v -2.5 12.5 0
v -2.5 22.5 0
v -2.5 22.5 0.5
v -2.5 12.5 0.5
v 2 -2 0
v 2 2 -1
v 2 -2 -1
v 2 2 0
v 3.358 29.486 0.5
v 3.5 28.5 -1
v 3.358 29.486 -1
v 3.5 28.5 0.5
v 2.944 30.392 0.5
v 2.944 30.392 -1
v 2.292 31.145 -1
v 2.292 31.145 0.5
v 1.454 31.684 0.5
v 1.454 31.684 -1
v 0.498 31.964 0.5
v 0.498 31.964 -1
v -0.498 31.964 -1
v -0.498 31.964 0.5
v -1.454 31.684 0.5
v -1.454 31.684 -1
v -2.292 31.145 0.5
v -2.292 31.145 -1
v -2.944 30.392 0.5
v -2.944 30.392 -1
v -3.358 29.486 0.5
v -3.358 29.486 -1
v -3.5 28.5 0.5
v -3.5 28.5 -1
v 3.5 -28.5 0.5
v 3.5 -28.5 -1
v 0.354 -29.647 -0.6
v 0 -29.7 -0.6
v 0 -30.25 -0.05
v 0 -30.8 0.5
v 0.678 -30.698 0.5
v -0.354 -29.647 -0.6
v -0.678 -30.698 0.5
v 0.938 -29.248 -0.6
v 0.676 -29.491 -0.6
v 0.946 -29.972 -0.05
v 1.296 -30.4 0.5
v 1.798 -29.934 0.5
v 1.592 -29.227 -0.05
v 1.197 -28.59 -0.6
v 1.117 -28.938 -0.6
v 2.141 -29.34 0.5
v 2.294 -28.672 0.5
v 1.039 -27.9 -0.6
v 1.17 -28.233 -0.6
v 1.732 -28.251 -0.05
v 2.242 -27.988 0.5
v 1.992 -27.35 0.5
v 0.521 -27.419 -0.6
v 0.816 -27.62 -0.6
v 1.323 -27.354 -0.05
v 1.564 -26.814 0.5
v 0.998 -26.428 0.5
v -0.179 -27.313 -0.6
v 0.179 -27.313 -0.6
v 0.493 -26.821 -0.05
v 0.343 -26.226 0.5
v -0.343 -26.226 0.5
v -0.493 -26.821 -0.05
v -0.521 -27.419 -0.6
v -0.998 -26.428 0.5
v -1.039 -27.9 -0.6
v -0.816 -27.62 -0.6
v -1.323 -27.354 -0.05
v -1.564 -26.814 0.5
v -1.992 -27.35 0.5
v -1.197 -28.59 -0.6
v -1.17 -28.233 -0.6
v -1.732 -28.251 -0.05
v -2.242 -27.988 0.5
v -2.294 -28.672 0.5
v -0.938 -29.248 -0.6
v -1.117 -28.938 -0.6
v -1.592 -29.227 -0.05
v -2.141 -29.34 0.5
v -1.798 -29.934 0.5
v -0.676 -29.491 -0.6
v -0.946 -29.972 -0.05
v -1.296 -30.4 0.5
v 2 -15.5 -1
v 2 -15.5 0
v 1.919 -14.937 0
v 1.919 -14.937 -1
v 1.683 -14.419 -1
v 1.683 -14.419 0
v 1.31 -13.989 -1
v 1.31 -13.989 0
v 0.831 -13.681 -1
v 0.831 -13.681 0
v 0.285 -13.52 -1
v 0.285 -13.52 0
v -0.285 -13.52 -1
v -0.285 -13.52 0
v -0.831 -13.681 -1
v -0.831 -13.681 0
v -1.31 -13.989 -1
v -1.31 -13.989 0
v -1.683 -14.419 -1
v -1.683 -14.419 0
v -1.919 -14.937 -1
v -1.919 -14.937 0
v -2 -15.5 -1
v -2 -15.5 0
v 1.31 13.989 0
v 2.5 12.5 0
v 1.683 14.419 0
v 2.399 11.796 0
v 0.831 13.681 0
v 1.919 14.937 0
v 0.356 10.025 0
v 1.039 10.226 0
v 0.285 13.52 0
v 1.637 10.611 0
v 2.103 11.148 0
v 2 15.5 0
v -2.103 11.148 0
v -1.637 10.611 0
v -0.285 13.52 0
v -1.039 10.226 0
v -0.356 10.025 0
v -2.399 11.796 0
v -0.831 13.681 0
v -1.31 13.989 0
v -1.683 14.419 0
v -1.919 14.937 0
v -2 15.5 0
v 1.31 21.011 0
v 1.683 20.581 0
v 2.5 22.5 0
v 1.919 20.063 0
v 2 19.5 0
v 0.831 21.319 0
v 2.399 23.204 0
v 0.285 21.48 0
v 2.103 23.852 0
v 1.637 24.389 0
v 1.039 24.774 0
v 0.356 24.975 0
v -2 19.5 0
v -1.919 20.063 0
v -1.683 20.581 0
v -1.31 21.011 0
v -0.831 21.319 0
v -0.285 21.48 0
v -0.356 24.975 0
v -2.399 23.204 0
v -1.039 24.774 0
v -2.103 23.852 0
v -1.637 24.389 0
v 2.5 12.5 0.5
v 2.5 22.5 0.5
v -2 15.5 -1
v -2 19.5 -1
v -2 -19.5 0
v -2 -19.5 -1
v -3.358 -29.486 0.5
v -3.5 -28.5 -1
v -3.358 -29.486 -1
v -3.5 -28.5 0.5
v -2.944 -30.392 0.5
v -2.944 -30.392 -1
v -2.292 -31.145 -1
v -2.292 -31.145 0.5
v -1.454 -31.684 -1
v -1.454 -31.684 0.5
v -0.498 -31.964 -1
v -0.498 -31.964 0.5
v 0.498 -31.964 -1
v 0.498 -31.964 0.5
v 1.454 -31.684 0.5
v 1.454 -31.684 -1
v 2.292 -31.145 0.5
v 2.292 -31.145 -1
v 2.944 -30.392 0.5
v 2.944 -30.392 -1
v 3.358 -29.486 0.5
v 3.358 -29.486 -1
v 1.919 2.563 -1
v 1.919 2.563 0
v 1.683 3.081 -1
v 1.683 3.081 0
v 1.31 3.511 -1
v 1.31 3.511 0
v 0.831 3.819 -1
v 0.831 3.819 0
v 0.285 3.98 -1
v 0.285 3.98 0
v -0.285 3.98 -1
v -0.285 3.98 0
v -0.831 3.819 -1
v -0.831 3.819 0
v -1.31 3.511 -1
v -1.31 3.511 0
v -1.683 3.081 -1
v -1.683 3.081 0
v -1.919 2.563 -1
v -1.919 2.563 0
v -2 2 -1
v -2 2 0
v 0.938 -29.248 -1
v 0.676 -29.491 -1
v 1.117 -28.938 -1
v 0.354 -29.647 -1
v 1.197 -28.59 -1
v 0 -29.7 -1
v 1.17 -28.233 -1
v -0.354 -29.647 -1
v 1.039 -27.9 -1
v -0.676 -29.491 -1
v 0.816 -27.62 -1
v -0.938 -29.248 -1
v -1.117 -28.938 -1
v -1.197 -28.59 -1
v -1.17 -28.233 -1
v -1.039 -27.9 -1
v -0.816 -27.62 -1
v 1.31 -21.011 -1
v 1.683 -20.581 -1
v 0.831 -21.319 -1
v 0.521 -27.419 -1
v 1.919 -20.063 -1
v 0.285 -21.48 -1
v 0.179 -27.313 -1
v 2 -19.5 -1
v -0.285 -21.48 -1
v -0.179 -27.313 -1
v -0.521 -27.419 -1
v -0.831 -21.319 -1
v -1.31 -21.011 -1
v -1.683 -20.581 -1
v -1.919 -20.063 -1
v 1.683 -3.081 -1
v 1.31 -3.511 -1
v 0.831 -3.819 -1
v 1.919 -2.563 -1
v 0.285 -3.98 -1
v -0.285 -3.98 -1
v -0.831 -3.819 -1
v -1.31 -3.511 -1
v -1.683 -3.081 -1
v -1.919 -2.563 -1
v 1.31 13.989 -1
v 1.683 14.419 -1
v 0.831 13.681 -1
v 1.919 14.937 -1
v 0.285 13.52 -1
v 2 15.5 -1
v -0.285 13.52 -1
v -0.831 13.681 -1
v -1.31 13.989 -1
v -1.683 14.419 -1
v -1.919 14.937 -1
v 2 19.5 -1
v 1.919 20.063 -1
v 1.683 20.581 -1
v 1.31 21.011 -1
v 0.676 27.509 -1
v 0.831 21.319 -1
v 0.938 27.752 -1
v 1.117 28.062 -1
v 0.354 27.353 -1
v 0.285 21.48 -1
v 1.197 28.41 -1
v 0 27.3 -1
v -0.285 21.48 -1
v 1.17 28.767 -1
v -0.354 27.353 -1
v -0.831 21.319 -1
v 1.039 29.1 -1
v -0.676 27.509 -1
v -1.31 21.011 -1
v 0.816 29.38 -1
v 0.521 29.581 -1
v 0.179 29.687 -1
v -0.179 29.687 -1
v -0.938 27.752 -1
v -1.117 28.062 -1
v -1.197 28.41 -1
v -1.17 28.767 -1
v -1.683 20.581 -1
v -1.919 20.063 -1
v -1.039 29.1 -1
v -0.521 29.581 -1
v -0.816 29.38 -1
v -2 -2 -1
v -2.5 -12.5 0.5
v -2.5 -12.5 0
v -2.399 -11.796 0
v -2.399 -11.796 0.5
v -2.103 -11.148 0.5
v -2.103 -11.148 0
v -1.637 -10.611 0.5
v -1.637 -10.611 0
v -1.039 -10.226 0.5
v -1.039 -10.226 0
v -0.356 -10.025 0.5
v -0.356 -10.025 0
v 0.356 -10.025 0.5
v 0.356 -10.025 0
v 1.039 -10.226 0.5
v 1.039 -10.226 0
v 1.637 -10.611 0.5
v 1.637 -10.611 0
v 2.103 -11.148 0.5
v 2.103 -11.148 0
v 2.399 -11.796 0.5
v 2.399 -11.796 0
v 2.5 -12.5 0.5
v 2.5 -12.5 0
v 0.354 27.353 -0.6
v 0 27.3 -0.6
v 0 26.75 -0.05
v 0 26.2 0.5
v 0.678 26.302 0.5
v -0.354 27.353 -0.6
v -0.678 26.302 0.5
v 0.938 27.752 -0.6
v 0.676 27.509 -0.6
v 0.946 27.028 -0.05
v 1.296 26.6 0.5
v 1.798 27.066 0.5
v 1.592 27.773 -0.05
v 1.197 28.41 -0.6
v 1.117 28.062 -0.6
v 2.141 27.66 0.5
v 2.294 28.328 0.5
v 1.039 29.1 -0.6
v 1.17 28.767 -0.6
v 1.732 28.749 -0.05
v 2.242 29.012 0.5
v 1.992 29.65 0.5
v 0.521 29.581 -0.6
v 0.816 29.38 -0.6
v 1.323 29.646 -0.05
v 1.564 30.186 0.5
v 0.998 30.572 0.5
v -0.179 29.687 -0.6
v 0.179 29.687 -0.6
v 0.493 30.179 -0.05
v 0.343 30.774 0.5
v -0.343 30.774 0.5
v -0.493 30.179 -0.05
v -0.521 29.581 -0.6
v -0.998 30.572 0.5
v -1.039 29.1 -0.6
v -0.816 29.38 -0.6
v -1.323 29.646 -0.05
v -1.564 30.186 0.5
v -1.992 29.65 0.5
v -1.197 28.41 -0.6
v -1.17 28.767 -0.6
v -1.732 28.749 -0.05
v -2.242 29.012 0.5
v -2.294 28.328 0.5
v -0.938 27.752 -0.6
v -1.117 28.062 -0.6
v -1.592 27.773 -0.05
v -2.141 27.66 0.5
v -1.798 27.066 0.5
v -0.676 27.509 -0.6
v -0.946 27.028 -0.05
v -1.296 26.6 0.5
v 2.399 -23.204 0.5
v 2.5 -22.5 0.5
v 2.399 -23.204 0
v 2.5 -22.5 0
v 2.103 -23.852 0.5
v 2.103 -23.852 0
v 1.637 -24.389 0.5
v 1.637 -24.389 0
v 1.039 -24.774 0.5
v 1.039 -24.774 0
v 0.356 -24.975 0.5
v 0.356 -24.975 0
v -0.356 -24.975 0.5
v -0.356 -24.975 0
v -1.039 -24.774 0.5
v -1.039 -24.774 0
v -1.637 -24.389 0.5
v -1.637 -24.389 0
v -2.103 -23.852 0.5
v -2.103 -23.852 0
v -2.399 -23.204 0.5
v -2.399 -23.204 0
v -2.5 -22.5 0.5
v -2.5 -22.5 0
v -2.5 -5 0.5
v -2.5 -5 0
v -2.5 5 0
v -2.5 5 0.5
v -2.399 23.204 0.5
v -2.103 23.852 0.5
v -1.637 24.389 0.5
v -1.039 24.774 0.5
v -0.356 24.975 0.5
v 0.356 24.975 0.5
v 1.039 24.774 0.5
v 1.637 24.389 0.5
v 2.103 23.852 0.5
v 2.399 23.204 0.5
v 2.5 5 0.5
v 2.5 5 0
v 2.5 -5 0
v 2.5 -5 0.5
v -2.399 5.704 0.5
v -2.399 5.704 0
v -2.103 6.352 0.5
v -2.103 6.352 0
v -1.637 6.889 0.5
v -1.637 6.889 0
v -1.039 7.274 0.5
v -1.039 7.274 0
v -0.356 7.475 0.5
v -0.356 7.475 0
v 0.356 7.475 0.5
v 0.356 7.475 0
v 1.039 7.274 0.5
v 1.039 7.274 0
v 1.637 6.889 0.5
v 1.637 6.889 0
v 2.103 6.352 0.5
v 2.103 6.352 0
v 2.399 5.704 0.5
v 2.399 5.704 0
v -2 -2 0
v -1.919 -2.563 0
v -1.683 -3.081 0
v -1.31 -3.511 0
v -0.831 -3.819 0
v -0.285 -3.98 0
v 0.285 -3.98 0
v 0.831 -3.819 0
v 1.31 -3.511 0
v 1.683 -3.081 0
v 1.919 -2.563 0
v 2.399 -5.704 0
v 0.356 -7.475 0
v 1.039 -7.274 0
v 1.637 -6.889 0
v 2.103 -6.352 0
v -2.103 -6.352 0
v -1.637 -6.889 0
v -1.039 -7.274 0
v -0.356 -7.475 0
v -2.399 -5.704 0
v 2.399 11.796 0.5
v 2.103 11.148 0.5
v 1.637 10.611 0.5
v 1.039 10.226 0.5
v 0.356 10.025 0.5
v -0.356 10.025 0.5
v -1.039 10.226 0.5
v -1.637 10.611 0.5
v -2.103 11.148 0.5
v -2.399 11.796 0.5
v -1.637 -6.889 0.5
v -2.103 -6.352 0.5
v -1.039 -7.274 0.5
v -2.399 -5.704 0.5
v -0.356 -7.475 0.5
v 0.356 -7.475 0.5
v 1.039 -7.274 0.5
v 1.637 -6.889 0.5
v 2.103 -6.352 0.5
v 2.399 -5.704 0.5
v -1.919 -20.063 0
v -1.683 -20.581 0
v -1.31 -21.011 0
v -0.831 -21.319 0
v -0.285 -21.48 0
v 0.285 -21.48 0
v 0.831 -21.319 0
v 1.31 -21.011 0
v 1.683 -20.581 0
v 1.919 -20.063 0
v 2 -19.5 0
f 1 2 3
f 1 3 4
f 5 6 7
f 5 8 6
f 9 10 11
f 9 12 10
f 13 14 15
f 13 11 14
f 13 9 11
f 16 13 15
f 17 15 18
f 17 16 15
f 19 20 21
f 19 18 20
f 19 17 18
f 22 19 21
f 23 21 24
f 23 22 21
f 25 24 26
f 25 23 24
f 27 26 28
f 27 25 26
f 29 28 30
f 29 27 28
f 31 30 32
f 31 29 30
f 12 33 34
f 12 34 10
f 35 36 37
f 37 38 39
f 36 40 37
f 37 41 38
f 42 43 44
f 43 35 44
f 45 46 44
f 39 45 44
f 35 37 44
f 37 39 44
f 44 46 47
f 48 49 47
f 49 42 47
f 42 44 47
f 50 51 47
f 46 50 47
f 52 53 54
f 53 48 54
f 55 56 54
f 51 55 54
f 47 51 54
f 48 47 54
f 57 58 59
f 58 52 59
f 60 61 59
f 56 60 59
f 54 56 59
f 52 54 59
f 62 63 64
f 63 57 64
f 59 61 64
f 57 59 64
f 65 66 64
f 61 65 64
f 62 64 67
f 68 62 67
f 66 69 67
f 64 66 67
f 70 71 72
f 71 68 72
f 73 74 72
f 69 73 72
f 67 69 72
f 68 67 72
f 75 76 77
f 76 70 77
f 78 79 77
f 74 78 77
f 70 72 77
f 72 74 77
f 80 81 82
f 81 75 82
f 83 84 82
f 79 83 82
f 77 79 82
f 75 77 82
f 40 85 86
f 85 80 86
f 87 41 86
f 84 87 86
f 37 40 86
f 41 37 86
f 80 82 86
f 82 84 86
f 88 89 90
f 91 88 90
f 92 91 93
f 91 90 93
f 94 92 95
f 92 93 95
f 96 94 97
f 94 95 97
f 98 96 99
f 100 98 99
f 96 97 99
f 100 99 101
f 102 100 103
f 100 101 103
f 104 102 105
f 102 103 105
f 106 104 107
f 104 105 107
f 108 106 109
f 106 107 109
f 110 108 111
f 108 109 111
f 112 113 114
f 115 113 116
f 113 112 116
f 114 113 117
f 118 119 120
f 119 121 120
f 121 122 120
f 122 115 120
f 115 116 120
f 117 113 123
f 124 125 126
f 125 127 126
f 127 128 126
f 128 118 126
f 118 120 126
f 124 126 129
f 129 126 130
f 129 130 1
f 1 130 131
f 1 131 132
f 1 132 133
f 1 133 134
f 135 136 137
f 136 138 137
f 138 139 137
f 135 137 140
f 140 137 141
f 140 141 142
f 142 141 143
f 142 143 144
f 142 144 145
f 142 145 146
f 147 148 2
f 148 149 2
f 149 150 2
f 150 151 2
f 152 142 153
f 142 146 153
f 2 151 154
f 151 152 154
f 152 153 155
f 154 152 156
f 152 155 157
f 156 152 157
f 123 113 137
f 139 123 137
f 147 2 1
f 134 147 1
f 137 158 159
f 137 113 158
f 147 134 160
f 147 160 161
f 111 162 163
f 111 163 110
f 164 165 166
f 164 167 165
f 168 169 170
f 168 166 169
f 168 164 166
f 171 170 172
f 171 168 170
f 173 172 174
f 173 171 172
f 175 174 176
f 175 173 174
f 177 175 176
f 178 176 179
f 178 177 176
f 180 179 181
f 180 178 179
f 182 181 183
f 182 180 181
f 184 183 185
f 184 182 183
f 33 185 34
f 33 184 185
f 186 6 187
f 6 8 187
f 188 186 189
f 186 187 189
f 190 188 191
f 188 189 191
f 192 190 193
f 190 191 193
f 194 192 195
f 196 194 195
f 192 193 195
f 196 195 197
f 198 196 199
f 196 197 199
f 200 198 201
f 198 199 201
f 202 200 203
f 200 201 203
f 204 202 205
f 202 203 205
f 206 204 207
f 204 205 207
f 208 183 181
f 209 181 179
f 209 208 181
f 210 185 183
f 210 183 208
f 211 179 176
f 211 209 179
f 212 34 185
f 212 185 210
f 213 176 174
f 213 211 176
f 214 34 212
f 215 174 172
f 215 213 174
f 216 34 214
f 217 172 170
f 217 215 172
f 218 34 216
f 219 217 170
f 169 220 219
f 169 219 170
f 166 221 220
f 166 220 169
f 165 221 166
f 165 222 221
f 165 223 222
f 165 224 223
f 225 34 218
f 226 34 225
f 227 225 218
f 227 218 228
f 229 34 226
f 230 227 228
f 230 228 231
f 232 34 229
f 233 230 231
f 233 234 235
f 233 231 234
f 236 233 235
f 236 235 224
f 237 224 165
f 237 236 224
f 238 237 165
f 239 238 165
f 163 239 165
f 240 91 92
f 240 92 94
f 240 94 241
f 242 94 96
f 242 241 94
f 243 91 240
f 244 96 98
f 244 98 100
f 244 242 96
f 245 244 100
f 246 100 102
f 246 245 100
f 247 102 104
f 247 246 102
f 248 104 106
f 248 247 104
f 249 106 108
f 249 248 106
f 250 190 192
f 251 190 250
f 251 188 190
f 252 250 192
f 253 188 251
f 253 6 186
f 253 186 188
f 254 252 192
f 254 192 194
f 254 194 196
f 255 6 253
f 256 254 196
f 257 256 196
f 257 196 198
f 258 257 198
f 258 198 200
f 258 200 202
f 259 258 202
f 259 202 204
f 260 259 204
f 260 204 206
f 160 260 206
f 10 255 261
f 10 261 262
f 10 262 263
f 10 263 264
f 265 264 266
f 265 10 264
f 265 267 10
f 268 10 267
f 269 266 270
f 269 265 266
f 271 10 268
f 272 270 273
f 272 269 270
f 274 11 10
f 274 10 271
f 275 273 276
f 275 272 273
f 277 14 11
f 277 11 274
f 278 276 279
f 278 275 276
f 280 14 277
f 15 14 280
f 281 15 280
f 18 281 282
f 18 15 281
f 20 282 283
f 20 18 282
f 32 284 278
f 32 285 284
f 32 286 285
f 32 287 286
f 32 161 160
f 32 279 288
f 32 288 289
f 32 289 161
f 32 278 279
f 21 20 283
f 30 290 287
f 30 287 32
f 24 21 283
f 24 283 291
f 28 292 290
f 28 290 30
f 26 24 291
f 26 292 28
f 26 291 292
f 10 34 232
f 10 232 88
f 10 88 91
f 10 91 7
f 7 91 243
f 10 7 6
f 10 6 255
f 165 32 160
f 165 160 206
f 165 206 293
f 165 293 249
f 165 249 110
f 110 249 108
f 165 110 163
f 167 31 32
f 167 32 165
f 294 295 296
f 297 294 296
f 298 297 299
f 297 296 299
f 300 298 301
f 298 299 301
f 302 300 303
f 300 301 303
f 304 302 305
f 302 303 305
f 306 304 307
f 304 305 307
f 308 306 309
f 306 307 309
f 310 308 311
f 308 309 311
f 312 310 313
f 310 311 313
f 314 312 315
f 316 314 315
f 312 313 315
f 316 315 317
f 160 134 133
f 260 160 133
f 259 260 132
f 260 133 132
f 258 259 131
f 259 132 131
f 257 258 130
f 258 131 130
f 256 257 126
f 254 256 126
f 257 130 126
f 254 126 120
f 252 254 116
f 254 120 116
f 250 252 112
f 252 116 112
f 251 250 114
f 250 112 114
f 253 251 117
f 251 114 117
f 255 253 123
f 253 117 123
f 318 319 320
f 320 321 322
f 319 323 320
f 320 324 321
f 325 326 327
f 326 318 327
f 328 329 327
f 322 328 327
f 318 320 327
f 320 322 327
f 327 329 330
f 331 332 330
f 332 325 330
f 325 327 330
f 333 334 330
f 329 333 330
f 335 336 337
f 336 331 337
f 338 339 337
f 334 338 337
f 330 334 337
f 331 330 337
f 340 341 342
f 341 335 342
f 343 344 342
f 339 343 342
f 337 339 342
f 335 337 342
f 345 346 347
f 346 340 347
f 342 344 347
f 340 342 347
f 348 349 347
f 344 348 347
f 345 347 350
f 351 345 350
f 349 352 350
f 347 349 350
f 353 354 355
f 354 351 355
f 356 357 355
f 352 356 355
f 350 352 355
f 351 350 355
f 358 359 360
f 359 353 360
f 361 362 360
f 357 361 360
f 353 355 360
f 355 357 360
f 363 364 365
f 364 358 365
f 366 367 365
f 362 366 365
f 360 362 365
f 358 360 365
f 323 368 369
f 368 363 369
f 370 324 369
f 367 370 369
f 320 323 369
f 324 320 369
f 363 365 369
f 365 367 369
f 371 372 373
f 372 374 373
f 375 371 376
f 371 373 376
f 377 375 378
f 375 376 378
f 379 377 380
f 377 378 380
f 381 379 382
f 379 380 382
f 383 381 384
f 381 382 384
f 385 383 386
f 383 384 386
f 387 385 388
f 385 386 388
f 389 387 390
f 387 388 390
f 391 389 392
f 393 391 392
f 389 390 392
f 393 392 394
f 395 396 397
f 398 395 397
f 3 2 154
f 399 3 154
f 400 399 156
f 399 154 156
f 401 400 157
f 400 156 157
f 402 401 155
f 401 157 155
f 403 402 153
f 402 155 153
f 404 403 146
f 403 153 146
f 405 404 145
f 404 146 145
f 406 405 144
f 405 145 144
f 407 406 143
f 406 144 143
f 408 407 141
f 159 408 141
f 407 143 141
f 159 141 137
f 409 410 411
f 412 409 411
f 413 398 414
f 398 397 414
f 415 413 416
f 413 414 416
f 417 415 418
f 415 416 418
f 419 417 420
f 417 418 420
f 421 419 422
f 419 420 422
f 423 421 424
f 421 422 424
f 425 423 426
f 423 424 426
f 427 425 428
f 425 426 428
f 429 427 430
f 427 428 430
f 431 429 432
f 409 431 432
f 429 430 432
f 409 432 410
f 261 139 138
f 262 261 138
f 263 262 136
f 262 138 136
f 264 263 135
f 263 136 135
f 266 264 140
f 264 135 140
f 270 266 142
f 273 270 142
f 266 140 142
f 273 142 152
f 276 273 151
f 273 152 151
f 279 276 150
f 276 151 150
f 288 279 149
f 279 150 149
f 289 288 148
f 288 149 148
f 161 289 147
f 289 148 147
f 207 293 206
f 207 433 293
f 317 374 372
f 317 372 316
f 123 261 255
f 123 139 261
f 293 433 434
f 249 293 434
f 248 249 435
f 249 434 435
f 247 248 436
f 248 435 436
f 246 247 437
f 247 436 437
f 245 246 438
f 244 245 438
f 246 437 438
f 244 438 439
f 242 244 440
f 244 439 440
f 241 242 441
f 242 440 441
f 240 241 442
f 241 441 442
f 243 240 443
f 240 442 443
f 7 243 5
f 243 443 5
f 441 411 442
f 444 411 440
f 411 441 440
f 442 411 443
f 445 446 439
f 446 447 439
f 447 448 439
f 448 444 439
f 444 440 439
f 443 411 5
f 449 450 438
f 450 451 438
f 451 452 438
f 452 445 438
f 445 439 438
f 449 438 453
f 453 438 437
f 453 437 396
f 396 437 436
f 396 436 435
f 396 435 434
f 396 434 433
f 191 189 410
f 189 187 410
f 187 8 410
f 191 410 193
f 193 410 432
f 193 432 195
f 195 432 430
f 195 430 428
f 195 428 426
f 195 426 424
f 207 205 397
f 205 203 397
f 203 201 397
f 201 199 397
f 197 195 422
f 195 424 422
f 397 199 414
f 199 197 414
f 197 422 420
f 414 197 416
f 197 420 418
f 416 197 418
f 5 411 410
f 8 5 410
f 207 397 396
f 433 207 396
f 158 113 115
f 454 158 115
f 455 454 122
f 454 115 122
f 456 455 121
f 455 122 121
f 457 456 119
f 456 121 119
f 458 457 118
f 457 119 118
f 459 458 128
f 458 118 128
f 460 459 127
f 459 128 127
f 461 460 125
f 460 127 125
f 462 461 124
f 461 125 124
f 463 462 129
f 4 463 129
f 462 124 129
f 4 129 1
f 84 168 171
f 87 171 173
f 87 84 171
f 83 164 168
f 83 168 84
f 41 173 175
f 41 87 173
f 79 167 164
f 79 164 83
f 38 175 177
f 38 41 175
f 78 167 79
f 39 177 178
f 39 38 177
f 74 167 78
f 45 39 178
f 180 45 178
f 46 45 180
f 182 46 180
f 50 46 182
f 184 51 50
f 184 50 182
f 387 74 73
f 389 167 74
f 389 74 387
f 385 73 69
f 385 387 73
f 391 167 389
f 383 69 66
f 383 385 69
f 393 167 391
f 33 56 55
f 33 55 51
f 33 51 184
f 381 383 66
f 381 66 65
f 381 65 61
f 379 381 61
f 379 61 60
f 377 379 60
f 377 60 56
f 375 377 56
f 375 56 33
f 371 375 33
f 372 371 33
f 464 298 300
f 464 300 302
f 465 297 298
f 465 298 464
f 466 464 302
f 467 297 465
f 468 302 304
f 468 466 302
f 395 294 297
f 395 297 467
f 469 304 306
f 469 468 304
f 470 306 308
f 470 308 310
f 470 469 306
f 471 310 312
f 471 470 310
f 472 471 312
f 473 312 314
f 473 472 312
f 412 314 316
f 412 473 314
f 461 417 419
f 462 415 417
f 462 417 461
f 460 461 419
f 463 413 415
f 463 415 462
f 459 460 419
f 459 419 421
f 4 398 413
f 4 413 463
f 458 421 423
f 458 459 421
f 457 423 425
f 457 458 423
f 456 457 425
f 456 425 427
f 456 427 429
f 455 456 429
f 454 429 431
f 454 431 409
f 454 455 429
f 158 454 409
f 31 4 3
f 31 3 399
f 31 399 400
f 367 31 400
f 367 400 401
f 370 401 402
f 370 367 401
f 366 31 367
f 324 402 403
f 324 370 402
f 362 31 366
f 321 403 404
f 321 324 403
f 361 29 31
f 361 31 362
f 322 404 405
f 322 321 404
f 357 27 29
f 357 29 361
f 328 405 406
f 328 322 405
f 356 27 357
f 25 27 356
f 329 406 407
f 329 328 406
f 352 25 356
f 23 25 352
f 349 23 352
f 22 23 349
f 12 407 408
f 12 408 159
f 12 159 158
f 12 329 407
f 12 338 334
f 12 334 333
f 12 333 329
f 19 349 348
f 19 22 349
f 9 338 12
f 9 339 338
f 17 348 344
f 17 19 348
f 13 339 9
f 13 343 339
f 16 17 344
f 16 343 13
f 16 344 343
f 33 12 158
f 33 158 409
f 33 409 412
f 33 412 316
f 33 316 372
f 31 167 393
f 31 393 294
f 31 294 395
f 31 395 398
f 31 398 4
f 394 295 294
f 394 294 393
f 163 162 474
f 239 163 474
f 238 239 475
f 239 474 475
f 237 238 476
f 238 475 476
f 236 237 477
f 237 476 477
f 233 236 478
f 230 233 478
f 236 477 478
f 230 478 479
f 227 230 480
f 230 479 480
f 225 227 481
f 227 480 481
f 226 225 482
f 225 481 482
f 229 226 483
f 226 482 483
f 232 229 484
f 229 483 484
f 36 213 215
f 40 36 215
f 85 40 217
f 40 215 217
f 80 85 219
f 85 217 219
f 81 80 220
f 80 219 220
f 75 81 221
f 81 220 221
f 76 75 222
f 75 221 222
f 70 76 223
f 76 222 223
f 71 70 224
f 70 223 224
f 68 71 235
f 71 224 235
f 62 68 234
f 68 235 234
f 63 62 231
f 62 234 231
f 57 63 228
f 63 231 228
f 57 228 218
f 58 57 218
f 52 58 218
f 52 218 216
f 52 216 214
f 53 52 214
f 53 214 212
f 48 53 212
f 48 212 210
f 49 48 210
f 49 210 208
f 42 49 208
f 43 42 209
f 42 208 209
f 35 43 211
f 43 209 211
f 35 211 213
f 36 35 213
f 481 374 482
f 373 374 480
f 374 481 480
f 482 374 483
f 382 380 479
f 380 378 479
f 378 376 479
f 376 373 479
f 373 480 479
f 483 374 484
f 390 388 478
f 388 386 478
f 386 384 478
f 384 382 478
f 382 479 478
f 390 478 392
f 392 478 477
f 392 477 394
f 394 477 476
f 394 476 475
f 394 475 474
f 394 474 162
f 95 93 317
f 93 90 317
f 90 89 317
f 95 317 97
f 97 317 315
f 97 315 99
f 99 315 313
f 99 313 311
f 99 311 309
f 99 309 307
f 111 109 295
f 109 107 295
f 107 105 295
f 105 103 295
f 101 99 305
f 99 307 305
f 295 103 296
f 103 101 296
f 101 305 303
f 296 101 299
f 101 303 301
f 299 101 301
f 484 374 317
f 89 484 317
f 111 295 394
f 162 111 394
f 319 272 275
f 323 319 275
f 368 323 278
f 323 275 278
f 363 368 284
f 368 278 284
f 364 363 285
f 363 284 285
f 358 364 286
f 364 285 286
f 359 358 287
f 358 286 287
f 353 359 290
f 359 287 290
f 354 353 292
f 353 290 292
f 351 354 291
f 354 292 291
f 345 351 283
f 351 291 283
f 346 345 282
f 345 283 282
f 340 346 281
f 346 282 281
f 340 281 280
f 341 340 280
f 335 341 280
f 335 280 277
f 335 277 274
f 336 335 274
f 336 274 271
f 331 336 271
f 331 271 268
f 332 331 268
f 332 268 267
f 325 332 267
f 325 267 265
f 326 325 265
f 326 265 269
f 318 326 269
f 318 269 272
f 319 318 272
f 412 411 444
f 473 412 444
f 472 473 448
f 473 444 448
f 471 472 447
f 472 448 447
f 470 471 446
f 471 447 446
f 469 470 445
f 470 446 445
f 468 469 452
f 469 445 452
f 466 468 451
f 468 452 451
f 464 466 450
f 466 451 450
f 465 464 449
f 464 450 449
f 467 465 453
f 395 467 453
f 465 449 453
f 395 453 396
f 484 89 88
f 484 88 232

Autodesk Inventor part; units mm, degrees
ref_plane "YZ Plane" through (0, 0, 0) normal (1, 0, 0) x (0, 1, 0)
ref_plane "XZ Plane" through (0, 0, 0) normal (0, 1, 0) x (-1, 0, 0)
ref_plane "XY Plane" through (0, 0, 0) normal (0, 0, 1) x (1, 0, 0)
sketch "Skizze1" plane through (0, 0, 0) normal (0, 0, 1) x (1, 0, 0)
  line L0 (-4.9, 0) -> (4.9, 0) projected
  line L1 (0, -44.8) -> (0, 44.8) projected
  line L2 (0, 5) -> (0, -5) construction
  line L3 (2.5, 5) -> (2.5, -5)
  line L4 (-2.5, -5) -> (-2.5, 5)
  arc A0 (2.5, 5) -> (-2.5, 5) centre (0, 5) ccw
  arc A1 (-2.5, -5) -> (2.5, -5) centre (0, -5) ccw
  line L5 (0, 28.5) -> (0, -28.5) construction
  line L6 (-3.5, 28.5) -> (-3.5, -28.5)
  line L7 (3.5, -28.5) -> (3.5, 28.5)
  arc A2 (3.5, 28.5) -> (-3.5, 28.5) centre (0, 28.5) ccw
  arc A3 (-3.5, -28.5) -> (3.5, -28.5) centre (0, -28.5) ccw
  line L8 (0, 12.5) -> (0, 22.5) construction
  line L9 (2.5, 12.5) -> (2.5, 22.5)
  line L10 (-2.5, 22.5) -> (-2.5, 12.5)
  arc A4 (-2.5, 12.5) -> (2.5, 12.5) centre (0, 12.5) ccw
  arc A5 (2.5, 22.5) -> (-2.5, 22.5) centre (0, 22.5) ccw
  line L11 (0, -22.5) -> (0, -12.5) construction
  line L12 (2.5, -22.5) -> (2.5, -12.5)
  line L13 (-2.5, -12.5) -> (-2.5, -22.5)
  arc A6 (-2.5, -22.5) -> (2.5, -22.5) centre (0, -22.5) ccw
  arc A7 (2.5, -12.5) -> (-2.5, -12.5) centre (0, -12.5) ccw
  point P0 (0, 0)
  point P1 (0, 0)
  point P2 (0, 0)
  point P3 (0, 17.5)
  point P4 (0, -17.5)
  dimension "d0" = 5
  dimension "d1" = 15
  dimension "d2" = 7
  dimension "d3" = 10
  dimension "d4" = 10
  dimension "d5" = 32
  dimension "d31" = 2.5
extrude "Extrusion1" add sketch "Skizze1" along normal blind 0.5 contours L6 A2 L1 A5 L10 A4 A0 L4 L0 | L0 L4 A1 L1 A7 L13 A6 A3 L6 | A2 L7 L0 L3 A0 L1 A4 L9 A5 | L1 A6 L12 A7 A1 L3 L0 L7 A3
sketch "Skizze2" plane through (0, 0, 0) normal (0, 0, -1) x (-1, 0, 0)
  line L0 (3.5, 28.5) -> (3.5, -28.5) projected
  arc A0 (3.5, 28.5) -> (-3.5, 28.5) centre (0, 28.5) ccw projected
  line L1 (-3.5, -28.5) -> (-3.5, 28.5) projected
  arc A1 (-3.5, -28.5) -> (3.5, -28.5) centre (0, -28.5) ccw projected
  point P0 (0, 0)
extrude "Extrusion2" add sketch "Skizze2" along normal blind 1
sketch "Skizze3" plane through (0, 0, 0.5) normal (0, 0, 1) x (1, 0, 0)
  arc A0 (-3.5, -28.5) -> (3.5, -28.5) centre (0, -28.5) ccw projected
  arc A1 (3.5, 28.5) -> (-3.5, 28.5) centre (0, 28.5) ccw projected
  point P0 (0, 0)
hole "Bohrung1" at (0, 28.5, 0.5) at (0, -28.5, 0.5) direction (0, 0, -1) diameter 2.4 end through all countersink diameter 4.6 countersink angle 90
sketch "Skizze5" plane through (0, 0, 0) normal (0, 0, 1) x (1, 0, 0)
  arc A0 (-2.5, -22.5) -> (2.5, -22.5) centre (0, -22.5) ccw projected
  line L0 (2.5, -22.5) -> (2.5, -12.5) projected
  arc A1 (2.5, -12.5) -> (-2.5, -12.5) centre (0, -12.5) ccw projected
  line L1 (0, -15.5) -> (0, -19.5) construction
  line L2 (2, -15.5) -> (2, -19.5)
  line L3 (-2, -19.5) -> (-2, -15.5)
  arc A2 (2, -15.5) -> (-2, -15.5) centre (0, -15.5) ccw
  arc A3 (-2, -19.5) -> (2, -19.5) centre (0, -19.5) ccw
  line L4 (0, -22.5) -> (0, -12.5)
  line L5 (0, -12.5) -> (0, -17.5)
  line L6 (-1.3218, -17.5) -> (0, -17.5)
  point P0 (0, 0)
  point P1 (0, -17.5)
  dimension "d24" = 4
  dimension "d25" = 8
extrude "Extrusion3" cut sketch "Skizze5" against normal through all
pattern_linear "Rechteckige Anordnung1" count 3 spacing 17.5 along (0, 1, 0) of "Extrusion3"
properties part number "13_1087_018"
